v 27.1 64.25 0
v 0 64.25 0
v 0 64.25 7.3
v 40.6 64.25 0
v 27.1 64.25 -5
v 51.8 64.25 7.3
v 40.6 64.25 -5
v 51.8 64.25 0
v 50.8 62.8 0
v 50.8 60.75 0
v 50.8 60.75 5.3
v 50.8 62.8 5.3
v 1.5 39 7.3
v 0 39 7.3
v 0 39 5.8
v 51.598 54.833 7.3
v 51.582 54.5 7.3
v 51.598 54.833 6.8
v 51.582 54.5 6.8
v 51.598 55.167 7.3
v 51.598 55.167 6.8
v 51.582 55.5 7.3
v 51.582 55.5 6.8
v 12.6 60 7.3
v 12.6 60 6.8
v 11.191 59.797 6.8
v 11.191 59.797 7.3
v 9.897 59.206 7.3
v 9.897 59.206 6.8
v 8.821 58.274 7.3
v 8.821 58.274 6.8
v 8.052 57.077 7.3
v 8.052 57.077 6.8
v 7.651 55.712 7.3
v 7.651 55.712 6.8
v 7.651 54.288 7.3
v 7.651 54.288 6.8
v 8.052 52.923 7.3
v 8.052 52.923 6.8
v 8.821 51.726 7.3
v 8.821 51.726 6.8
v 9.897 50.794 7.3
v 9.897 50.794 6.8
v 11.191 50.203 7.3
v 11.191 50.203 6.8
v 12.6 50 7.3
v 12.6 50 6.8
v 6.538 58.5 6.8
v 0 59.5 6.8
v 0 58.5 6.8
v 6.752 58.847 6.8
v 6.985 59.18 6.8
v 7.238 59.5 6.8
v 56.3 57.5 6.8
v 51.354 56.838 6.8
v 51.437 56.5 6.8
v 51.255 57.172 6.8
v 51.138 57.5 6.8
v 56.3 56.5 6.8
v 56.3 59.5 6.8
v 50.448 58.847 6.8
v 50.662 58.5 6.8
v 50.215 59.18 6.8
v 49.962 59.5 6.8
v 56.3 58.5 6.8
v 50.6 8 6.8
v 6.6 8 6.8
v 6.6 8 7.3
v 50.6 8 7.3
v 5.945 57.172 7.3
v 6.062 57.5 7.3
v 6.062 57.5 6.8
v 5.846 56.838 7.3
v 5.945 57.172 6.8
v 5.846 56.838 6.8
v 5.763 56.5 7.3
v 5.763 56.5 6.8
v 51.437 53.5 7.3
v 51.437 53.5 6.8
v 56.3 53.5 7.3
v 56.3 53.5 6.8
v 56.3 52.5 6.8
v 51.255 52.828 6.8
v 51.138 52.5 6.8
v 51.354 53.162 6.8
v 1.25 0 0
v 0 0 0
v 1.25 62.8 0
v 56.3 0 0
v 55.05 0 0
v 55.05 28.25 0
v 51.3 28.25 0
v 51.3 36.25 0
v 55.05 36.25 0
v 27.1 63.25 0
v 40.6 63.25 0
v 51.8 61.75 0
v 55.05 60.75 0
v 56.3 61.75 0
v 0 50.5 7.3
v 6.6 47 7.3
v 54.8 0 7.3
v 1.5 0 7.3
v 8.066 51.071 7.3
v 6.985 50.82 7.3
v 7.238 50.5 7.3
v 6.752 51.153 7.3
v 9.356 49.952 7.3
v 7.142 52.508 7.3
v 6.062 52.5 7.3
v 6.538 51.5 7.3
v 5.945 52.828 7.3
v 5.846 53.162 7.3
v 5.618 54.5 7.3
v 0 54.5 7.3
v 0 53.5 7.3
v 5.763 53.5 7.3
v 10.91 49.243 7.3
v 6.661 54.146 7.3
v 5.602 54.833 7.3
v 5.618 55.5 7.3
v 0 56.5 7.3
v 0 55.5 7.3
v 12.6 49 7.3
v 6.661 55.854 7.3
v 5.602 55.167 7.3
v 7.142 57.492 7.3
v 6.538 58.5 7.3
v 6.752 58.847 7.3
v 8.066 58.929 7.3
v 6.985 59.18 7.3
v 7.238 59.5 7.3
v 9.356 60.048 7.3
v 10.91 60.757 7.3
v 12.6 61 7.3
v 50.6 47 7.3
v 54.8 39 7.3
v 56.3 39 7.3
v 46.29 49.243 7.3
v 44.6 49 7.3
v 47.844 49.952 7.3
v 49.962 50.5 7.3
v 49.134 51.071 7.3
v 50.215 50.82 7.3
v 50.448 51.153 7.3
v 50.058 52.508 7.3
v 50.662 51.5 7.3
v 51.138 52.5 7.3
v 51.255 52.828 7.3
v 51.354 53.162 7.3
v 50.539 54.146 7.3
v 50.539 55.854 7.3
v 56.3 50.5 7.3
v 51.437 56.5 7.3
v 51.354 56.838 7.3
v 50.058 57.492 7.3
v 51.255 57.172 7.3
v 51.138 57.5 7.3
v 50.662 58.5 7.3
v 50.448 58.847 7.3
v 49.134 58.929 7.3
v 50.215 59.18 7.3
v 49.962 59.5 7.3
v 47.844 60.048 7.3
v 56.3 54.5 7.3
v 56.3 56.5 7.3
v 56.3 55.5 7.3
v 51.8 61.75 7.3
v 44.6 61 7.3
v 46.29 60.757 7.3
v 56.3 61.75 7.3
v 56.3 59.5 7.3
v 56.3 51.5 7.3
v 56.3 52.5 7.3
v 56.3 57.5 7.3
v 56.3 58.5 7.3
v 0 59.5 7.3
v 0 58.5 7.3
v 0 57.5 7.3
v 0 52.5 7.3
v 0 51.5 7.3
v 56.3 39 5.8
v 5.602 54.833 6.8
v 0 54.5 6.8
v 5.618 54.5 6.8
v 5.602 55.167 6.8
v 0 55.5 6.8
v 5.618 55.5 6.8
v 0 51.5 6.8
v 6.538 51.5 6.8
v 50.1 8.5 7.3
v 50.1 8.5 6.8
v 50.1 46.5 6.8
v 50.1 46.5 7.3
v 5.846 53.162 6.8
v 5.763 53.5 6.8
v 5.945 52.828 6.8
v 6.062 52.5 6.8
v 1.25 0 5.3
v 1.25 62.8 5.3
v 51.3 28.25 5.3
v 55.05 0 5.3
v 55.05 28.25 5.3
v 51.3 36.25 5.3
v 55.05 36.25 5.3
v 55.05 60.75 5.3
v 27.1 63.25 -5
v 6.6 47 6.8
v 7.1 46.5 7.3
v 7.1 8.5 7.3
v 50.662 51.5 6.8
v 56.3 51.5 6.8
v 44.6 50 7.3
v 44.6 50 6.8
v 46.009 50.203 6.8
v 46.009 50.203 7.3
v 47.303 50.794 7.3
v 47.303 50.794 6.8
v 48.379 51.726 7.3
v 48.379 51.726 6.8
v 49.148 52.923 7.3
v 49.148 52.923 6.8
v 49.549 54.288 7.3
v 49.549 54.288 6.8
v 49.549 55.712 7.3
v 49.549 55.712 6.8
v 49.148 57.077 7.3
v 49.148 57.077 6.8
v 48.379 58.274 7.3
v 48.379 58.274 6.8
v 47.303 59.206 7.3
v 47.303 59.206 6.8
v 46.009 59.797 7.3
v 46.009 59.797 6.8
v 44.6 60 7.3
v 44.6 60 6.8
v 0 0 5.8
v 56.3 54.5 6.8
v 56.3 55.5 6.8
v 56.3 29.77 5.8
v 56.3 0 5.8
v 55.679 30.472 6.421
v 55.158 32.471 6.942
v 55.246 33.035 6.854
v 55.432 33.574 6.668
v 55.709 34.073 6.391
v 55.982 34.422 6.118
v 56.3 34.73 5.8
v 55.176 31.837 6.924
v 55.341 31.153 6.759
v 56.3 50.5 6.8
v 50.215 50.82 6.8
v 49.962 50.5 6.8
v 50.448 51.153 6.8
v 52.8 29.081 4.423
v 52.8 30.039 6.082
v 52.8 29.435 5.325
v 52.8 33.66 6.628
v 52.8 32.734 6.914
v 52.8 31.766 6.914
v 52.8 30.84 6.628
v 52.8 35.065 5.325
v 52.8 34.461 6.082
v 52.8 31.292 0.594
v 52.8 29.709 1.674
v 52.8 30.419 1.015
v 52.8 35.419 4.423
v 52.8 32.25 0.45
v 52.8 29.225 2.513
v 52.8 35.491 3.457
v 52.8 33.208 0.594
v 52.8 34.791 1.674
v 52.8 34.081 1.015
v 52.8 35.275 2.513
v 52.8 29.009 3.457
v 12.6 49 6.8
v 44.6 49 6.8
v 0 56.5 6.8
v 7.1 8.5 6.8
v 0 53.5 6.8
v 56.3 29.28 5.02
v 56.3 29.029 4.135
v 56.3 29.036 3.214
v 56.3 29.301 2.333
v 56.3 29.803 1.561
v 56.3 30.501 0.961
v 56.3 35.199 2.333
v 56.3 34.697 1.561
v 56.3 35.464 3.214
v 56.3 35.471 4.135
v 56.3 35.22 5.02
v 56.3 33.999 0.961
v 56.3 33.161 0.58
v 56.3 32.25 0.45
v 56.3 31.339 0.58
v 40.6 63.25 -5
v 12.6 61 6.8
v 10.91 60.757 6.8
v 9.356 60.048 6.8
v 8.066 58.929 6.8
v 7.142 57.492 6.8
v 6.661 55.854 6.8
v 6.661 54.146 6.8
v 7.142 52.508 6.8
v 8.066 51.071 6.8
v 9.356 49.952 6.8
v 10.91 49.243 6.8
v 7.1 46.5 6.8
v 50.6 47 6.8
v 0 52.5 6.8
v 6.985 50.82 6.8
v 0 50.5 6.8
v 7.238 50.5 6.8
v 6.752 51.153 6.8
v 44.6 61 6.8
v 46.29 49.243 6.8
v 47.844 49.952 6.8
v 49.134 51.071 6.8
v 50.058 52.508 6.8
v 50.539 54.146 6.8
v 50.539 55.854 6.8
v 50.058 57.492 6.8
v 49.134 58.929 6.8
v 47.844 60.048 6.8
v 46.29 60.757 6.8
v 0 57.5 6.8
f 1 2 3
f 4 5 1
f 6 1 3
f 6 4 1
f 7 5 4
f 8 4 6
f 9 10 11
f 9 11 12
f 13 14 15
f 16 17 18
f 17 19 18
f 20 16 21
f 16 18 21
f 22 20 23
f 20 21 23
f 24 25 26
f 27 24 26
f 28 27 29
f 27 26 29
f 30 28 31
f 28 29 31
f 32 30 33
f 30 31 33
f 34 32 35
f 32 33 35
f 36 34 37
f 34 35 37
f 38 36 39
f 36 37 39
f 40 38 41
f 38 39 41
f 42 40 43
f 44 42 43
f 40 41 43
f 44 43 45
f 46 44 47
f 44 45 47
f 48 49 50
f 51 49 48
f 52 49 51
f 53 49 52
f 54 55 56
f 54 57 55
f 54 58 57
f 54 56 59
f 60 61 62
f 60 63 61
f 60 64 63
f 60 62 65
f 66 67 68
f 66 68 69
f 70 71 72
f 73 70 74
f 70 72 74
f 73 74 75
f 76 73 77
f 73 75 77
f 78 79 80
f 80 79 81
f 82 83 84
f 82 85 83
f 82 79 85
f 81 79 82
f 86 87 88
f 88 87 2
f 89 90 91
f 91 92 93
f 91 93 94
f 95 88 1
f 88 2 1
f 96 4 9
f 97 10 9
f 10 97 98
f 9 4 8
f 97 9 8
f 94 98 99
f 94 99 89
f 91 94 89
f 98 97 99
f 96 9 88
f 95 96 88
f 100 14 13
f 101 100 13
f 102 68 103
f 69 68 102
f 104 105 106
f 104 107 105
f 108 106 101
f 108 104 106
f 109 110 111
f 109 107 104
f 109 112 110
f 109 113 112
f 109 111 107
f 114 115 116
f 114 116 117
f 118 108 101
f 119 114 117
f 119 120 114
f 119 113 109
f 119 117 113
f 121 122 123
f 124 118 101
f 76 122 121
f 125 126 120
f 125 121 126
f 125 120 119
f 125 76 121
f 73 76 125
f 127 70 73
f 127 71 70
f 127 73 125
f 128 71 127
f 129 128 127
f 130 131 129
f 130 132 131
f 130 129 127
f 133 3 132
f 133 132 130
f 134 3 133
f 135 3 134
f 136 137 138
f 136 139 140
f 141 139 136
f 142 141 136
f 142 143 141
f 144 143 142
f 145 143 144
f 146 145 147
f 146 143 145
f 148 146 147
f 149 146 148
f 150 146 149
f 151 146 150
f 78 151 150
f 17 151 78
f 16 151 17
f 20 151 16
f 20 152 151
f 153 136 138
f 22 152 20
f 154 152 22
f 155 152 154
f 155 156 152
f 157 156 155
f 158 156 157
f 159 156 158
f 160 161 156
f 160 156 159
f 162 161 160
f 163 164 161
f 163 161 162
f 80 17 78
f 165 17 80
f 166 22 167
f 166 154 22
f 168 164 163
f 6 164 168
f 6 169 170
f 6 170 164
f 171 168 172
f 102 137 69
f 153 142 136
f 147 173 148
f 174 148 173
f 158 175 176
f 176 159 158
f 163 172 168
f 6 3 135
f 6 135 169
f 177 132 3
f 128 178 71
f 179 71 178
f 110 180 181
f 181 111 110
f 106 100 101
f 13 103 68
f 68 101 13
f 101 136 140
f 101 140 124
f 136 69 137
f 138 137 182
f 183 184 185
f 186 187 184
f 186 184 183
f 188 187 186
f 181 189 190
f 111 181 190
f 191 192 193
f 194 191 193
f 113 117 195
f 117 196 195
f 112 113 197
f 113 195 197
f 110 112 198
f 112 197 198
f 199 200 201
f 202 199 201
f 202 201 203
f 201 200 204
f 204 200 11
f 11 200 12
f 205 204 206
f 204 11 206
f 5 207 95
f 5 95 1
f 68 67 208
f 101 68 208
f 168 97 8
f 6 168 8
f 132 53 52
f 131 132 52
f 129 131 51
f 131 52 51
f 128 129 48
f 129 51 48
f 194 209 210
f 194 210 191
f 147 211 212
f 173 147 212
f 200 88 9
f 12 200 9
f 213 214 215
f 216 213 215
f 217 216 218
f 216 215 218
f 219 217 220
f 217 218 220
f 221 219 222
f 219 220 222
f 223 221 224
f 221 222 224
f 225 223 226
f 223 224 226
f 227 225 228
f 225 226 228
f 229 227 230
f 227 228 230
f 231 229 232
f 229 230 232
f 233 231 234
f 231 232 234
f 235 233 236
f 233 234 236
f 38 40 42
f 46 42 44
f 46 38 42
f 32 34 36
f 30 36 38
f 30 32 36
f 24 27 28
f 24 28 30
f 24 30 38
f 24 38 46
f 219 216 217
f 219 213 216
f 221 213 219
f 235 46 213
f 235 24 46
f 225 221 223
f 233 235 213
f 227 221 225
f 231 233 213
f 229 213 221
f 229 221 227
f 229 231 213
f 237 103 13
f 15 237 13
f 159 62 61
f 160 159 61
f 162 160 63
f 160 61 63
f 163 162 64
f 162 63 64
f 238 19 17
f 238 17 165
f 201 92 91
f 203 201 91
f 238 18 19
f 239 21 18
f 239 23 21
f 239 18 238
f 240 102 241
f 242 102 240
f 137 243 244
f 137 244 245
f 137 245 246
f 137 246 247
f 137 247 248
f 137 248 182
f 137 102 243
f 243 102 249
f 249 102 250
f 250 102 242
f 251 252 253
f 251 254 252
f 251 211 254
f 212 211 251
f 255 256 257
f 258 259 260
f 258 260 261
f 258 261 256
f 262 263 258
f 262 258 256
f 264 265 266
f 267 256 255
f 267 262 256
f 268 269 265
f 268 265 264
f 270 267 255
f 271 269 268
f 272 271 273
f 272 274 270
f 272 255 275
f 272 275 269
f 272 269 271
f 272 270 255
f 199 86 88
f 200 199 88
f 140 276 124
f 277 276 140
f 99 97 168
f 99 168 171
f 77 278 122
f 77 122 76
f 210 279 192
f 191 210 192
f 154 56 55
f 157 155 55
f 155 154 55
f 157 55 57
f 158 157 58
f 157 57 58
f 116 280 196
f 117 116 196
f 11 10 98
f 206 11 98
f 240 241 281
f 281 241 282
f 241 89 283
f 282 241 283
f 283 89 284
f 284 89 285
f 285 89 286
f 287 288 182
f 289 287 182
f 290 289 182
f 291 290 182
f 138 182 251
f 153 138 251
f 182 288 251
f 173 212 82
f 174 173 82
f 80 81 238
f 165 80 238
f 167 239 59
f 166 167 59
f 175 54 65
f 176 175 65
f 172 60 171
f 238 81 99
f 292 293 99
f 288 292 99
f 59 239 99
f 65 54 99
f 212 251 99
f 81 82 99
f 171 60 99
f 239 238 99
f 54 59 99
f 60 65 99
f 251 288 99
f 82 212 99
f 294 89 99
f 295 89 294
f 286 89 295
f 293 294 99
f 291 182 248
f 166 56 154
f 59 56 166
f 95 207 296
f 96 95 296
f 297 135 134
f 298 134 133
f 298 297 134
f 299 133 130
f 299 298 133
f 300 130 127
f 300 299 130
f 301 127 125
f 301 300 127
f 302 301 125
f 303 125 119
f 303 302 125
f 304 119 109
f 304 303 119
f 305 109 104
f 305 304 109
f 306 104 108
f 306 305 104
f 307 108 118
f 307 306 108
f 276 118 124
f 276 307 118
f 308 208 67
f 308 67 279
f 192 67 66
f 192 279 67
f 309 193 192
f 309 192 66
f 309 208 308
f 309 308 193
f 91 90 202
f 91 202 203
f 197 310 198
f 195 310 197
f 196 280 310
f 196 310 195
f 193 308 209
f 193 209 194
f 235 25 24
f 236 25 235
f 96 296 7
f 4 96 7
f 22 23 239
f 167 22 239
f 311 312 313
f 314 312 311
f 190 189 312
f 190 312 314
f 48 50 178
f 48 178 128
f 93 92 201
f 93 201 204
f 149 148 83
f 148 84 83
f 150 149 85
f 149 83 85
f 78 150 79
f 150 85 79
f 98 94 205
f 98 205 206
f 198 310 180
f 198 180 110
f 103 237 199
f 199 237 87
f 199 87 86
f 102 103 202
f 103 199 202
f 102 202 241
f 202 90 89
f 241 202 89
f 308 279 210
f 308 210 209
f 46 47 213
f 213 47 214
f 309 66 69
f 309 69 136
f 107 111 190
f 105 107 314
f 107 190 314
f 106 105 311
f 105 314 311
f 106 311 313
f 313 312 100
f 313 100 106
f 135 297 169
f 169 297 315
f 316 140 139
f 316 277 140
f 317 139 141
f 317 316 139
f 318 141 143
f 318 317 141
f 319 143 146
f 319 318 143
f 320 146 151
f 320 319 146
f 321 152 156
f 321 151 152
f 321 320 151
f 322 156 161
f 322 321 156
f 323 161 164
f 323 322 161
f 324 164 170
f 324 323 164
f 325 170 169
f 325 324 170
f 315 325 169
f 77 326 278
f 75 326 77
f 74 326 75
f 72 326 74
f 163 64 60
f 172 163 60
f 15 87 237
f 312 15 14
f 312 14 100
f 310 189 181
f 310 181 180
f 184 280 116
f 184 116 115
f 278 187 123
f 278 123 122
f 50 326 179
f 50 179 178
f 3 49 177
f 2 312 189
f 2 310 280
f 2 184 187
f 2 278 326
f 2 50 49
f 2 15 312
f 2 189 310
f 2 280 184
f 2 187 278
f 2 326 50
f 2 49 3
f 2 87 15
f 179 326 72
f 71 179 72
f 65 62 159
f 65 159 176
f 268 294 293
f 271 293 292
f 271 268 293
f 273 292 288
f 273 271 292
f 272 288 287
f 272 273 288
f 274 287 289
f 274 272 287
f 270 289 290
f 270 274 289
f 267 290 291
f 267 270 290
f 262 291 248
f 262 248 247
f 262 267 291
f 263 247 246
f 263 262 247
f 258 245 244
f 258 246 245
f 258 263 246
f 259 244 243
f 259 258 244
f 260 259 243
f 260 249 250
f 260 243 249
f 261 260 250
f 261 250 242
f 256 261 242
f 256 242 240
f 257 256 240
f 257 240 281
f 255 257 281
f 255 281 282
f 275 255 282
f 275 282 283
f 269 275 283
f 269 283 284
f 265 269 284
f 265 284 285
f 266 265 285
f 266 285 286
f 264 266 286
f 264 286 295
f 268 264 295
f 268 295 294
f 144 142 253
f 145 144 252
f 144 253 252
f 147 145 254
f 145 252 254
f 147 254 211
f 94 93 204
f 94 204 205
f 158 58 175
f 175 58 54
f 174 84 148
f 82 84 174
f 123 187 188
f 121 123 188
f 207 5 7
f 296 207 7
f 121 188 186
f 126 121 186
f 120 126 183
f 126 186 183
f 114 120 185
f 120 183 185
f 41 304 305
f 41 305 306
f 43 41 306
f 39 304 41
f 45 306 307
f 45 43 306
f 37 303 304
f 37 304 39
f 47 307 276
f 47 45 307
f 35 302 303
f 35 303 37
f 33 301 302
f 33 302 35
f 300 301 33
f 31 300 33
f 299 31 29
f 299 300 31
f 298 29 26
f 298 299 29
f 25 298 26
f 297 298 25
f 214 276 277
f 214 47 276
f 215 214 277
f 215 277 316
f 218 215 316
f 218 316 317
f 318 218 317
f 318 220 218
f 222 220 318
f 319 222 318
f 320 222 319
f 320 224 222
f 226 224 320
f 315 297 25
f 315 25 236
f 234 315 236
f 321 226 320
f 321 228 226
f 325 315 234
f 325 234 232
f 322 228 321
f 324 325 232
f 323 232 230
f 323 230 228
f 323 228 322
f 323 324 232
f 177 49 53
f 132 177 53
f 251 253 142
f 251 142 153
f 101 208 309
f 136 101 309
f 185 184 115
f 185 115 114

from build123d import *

# Parameters (mm, degrees)
CYLINDER_R        = 3.25
CYLINDER_DEPTH    = 3.5
BOX017_W          = 43
BOX017_H          = 38
BOX017_DEPTH      = 0.5
BOX057_W          = 4
BOX057_H          = 8
BOX057_DEPTH      = 5.3
BOX001_W          = 4.5
BOX001_H          = 2.5
BOX001_DEPTH      = 5.3
BOX003_W          = 5.5
BOX003_H          = 3.5
BOX003_DEPTH      = 5.3
BOX002_W          = 53.8
BOX002_H          = 62.8
BOX002_DEPTH      = 5.3
BOX_W             = 56.3
BOX_H             = 64.25
BOX_DEPTH         = 5.3
BOX056_W          = 13.5
BOX056_H          = 1
BOX056_DEPTH      = 5
BOX041_W          = 44
BOX041_H          = 39
BOX041_DEPTH      = 0.5
BOX008_W          = 56.3
BOX008_H          = 39
BOX008_DEPTH      = 2
CHAMFER_SIZE      = 1.5
CYLINDER011_R     = 5
CYLINDER011_DEPTH = 0.5
BOX055_W          = 32
BOX055_H          = 10
BOX055_DEPTH      = 0.5
CYLINDER010_R     = 5
CYLINDER010_DEPTH = 0.5
BOX044_W          = 32
BOX044_H          = 12
BOX044_DEPTH      = 1
CYLINDER007_R     = 6
CYLINDER007_DEPTH = 1
CYLINDER006_R     = 6
CYLINDER006_DEPTH = 1
CYLINDER008_R     = 7
CYLINDER008_DEPTH = 1
BOX047_W          = 10
BOX047_H          = 1
BOX047_DEPTH      = 1
BOX049_W          = 10
BOX049_H          = 1
BOX049_DEPTH      = 1
BOX048_W          = 10
BOX048_H          = 1
BOX048_DEPTH      = 1
BOX046_W          = 10
BOX046_H          = 1
BOX046_DEPTH      = 1
BOX045_W          = 10
BOX045_H          = 1
BOX045_DEPTH      = 1
CYLINDER009_R     = 7
CYLINDER009_DEPTH = 1
BOX051_W          = 10
BOX051_H          = 1
BOX051_DEPTH      = 1
BOX054_W          = 10
BOX054_H          = 1
BOX054_DEPTH      = 1
BOX053_W          = 10
BOX053_H          = 1
BOX053_DEPTH      = 1
BOX052_W          = 10
BOX052_H          = 1
BOX052_DEPTH      = 1
BOX050_W          = 10
BOX050_H          = 1
BOX050_DEPTH      = 1
BOX010_W          = 10
BOX010_H          = 10
BOX010_DEPTH      = 10
BOX007_W          = 56.3
BOX007_H          = 25.25
BOX007_DEPTH      = 2


with BuildPart() as cylinder_magnet:
    # Cylinder → Cylinder (new body)
    with BuildSketch(Plane(origin=(52.8, 32.25, 3.7), x_dir=(0, 0, -1), z_dir=(1, 0, 0))):
        Circle(CYLINDER_R)
    extrude(amount=CYLINDER_DEPTH)


with BuildPart() as cube_game_lable_inner:
    # Box017 → Box017 (new body)
    with BuildSketch(Plane(origin=(7.1, 8.5, 6.8), x_dir=(1, 0, 0), z_dir=(0, 0, 1))):
        with Locations((21.5, 19)):
            Rectangle(BOX017_W, BOX017_H)
    extrude(amount=BOX017_DEPTH)


with BuildPart() as cube_magnet_black:
    # Box057 → Box057 (new body)
    with BuildSketch(Plane(origin=(51.3, 28.25, 0), x_dir=(1, 0, 0), z_dir=(0, 0, 1))):
        with Locations((2, 4)):
            Rectangle(BOX057_W, BOX057_H)
    extrude(amount=BOX057_DEPTH)


with BuildPart() as cube_corner_inner:
    # Box001 → Box001 (new body)
    with BuildSketch(Plane(origin=(51.8, 61.75, 0), x_dir=(1, 0, 0), z_dir=(0, 0, 1))):
        with Locations((2.25, 1.25)):
            Rectangle(BOX001_W, BOX001_H)
    extrude(amount=BOX001_DEPTH)


with BuildPart() as cube_corner_outer:
    # Box003 → Box003 (new body)
    with BuildSketch(Plane(origin=(50.8, 60.75, 0), x_dir=(1, 0, 0), z_dir=(0, 0, 1))):
        with Locations((2.75, 1.75)):
            Rectangle(BOX003_W, BOX003_H)
    extrude(amount=BOX003_DEPTH)


with BuildPart() as cube_inner_base:
    # Box002 → Box002 (new body)
    with BuildSketch(Plane(origin=(1.25, 0, 0), x_dir=(1, 0, 0), z_dir=(0, 0, 1))):
        with Locations((26.9, 31.4)):
            Rectangle(BOX002_W, BOX002_H)
    extrude(amount=BOX002_DEPTH)


with BuildPart() as cut024:
    # Box → Box (new body)
    with BuildSketch(Plane.XY):
        with Locations((28.15, 32.125)):
            Rectangle(BOX_W, BOX_H)
    extrude(amount=BOX_DEPTH)

    # Cut: cut Cube(inner_base)
    add(cube_inner_base.part, mode=Mode.SUBTRACT)

    # Fusion: union Cube(corner_outer)
    add(cube_corner_outer.part)

    # Cut024: cut Cube(corner_inner)
    add(cube_corner_inner.part, mode=Mode.SUBTRACT)


with BuildPart() as cube_sd_card_cover:
    # Box056 → Box056 (new body)
    with BuildSketch(Plane(origin=(27.1, 63.25, -5), x_dir=(1, 0, 0), z_dir=(0, 0, 1))):
        with Locations((6.75, 0.5)):
            Rectangle(BOX056_W, BOX056_H)
    extrude(amount=BOX056_DEPTH)


with BuildPart() as cube_game_lable_outer:
    # Box041 → Box041 (new body)
    with BuildSketch(Plane(origin=(6.6, 8, 6.8), x_dir=(1, 0, 0), z_dir=(0, 0, 1))):
        with Locations((22, 19.5)):
            Rectangle(BOX041_W, BOX041_H)
    extrude(amount=BOX041_DEPTH)


with BuildPart() as chamfer_body:
    # Box008 → Box008 (new body)
    with BuildSketch(Plane.XY.offset(5.3)):
        with Locations((28.15, 19.5)):
            Rectangle(BOX008_W, BOX008_H)
    extrude(amount=BOX008_DEPTH)

    # Chamfer
    chamfer_edges = [chamfer_body.edges().sort_by_distance(p)[0] for p in [
        (0, 19.5, 7.3),
        (56.3, 19.5, 7.3),
    ]]
    chamfer(chamfer_edges, length=CHAMFER_SIZE)


with BuildPart() as cylinder002_right_nintendo_inner:
    # Cylinder011 → Cylinder011 (new body)
    with BuildSketch(Plane(origin=(44.6, 55, 6.8), x_dir=(1, 0, 0), z_dir=(0, 0, 1))):
        Circle(CYLINDER011_R)
    extrude(amount=CYLINDER011_DEPTH)


with BuildPart() as cube_middle_nintendo_inner:
    # Box055 → Box055 (new body)
    with BuildSketch(Plane(origin=(12.6, 50, 6.8), x_dir=(1, 0, 0), z_dir=(0, 0, 1))):
        with Locations((16, 5)):
            Rectangle(BOX055_W, BOX055_H)
    extrude(amount=BOX055_DEPTH)


with BuildPart() as fusion033:
    # Cylinder010 → Cylinder010 (new body)
    with BuildSketch(Plane(origin=(12.6, 55, 6.8), x_dir=(1, 0, 0), z_dir=(0, 0, 1))):
        Circle(CYLINDER010_R)
    extrude(amount=CYLINDER010_DEPTH)

    # Fusion033: union Cylinder002(right_nintendo_inner), Cube(middle_nintendo_inner)
    add(cylinder002_right_nintendo_inner.part)
    add(cube_middle_nintendo_inner.part)


with BuildPart() as cube_middle_nintendo_outer:
    # Box044 → Box044 (new body)
    with BuildSketch(Plane(origin=(12.6, 49, 6.8), x_dir=(1, 0, 0), z_dir=(0, 0, 1))):
        with Locations((16, 6)):
            Rectangle(BOX044_W, BOX044_H)
    extrude(amount=BOX044_DEPTH)


with BuildPart() as cylinder002_right_nintendo_outer:
    # Cylinder007 → Cylinder007 (new body)
    with BuildSketch(Plane(origin=(44.6, 55, 6.8), x_dir=(1, 0, 0), z_dir=(0, 0, 1))):
        Circle(CYLINDER007_R)
    extrude(amount=CYLINDER007_DEPTH)


with BuildPart() as cylinder001_left_nintendo_outer:
    # Cylinder006 → Cylinder006 (new body)
    with BuildSketch(Plane(origin=(12.6, 55, 6.8), x_dir=(1, 0, 0), z_dir=(0, 0, 1))):
        Circle(CYLINDER006_R)
    extrude(amount=CYLINDER006_DEPTH)


with BuildPart() as cylinder001_left_nintendo_fin_cut:
    # Cylinder008 → Cylinder008 (new body)
    with BuildSketch(Plane(origin=(12.6, 55, 6.8), x_dir=(1, 0, 0), z_dir=(0, 0, 1))):
        Circle(CYLINDER008_R)
    extrude(amount=CYLINDER008_DEPTH)


with BuildPart() as box047:
    # Box047 → Box047 (new body)
    with BuildSketch(Plane(origin=(0, 54.5, 6.8), x_dir=(1, 0, 0), z_dir=(0, 0, 1))):
        with Locations((5, 0.5)):
            Rectangle(BOX047_W, BOX047_H)
    extrude(amount=BOX047_DEPTH)


with BuildPart() as box049:
    # Box049 → Box049 (new body)
    with BuildSketch(Plane(origin=(0, 58.5, 6.8), x_dir=(1, 0, 0), z_dir=(0, 0, 1))):
        with Locations((5, 0.5)):
            Rectangle(BOX049_W, BOX049_H)
    extrude(amount=BOX049_DEPTH)


with BuildPart() as box048:
    # Box048 → Box048 (new body)
    with BuildSketch(Plane(origin=(0, 56.5, 6.8), x_dir=(1, 0, 0), z_dir=(0, 0, 1))):
        with Locations((5, 0.5)):
            Rectangle(BOX048_W, BOX048_H)
    extrude(amount=BOX048_DEPTH)


with BuildPart() as box046:
    # Box046 → Box046 (new body)
    with BuildSketch(Plane(origin=(0, 52.5, 6.8), x_dir=(1, 0, 0), z_dir=(0, 0, 1))):
        with Locations((5, 0.5)):
            Rectangle(BOX046_W, BOX046_H)
    extrude(amount=BOX046_DEPTH)


with BuildPart() as cut009:
    # Box045 → Box045 (new body)
    with BuildSketch(Plane(origin=(0, 50.5, 6.8), x_dir=(1, 0, 0), z_dir=(0, 0, 1))):
        with Locations((5, 0.5)):
            Rectangle(BOX045_W, BOX045_H)
    extrude(amount=BOX045_DEPTH)

    # Fusion004: union Box047, Box049, Box048, Box046
    add(box047.part)
    add(box049.part)
    add(box048.part)
    add(box046.part)

    # Cut009: cut Cylinder001(left_nintendo_fin_cut)
    add(cylinder001_left_nintendo_fin_cut.part, mode=Mode.SUBTRACT)


with BuildPart() as cylinder002_right_nintendo_fin_cut:
    # Cylinder009 → Cylinder009 (new body)
    with BuildSketch(Plane(origin=(44.6, 55, 6.8), x_dir=(1, 0, 0), z_dir=(0, 0, 1))):
        Circle(CYLINDER009_R)
    extrude(amount=CYLINDER009_DEPTH)


with BuildPart() as box051:
    # Box051 → Box051 (new body)
    with BuildSketch(Plane(origin=(46.3, 54.5, 6.8), x_dir=(1, 0, 0), z_dir=(0, 0, 1))):
        with Locations((5, 0.5)):
            Rectangle(BOX051_W, BOX051_H)
    extrude(amount=BOX051_DEPTH)


with BuildPart() as box054:
    # Box054 → Box054 (new body)
    with BuildSketch(Plane(origin=(46.3, 52.5, 6.8), x_dir=(1, 0, 0), z_dir=(0, 0, 1))):
        with Locations((5, 0.5)):
            Rectangle(BOX054_W, BOX054_H)
    extrude(amount=BOX054_DEPTH)


with BuildPart() as box053:
    # Box053 → Box053 (new body)
    with BuildSketch(Plane(origin=(46.3, 56.5, 6.8), x_dir=(1, 0, 0), z_dir=(0, 0, 1))):
        with Locations((5, 0.5)):
            Rectangle(BOX053_W, BOX053_H)
    extrude(amount=BOX053_DEPTH)


with BuildPart() as box052:
    # Box052 → Box052 (new body)
    with BuildSketch(Plane(origin=(46.3, 58.5, 6.8), x_dir=(1, 0, 0), z_dir=(0, 0, 1))):
        with Locations((5, 0.5)):
            Rectangle(BOX052_W, BOX052_H)
    extrude(amount=BOX052_DEPTH)


with BuildPart() as cut008:
    # Box050 → Box050 (new body)
    with BuildSketch(Plane(origin=(46.3, 50.5, 6.8), x_dir=(1, 0, 0), z_dir=(0, 0, 1))):
        with Locations((5, 0.5)):
            Rectangle(BOX050_W, BOX050_H)
    extrude(amount=BOX050_DEPTH)

    # Fusion003: union Box051, Box054, Box053, Box052
    add(box051.part)
    add(box054.part)
    add(box053.part)
    add(box052.part)

    # Cut008: cut Cylinder002(right_nintendo_fin_cut)
    add(cylinder002_right_nintendo_fin_cut.part, mode=Mode.SUBTRACT)


with BuildPart() as cube_top_corner_cut:
    # Box010 → Box010 (new body)
    with BuildSketch(Plane(origin=(51.8, 61.75, 0), x_dir=(1, 0, 0), z_dir=(0, 0, 1))):
        with Locations((5, 5)):
            Rectangle(BOX010_W, BOX010_H)
    extrude(amount=BOX010_DEPTH)


with BuildPart() as cut026:
    # Box007 → Box007 (new body)
    with BuildSketch(Plane(origin=(0, 39, 5.3), x_dir=(1, 0, 0), z_dir=(0, 0, 1))):
        with Locations((28.15, 12.625)):
            Rectangle(BOX007_W, BOX007_H)
    extrude(amount=BOX007_DEPTH)

    # Cut006: cut Cube(top_corner_cut)
    add(cube_top_corner_cut.part, mode=Mode.SUBTRACT)

    # Cut010: cut Cut008
    add(cut008.part, mode=Mode.SUBTRACT)

    # Cut011: cut Cut009
    add(cut009.part, mode=Mode.SUBTRACT)

    # Cut012: cut Cylinder001(left_nintendo_outer)
    add(cylinder001_left_nintendo_outer.part, mode=Mode.SUBTRACT)

    # Cut013: cut Cylinder002(right_nintendo_outer)
    add(cylinder002_right_nintendo_outer.part, mode=Mode.SUBTRACT)

    # Cut014: cut Cube(middle_nintendo_outer)
    add(cube_middle_nintendo_outer.part, mode=Mode.SUBTRACT)

    # Fusion034: union Chamfer body, Fusion033
    add(chamfer_body.part)
    add(fusion033.part)

    # Cut025: cut Cube(game_lable_outer)
    add(cube_game_lable_outer.part, mode=Mode.SUBTRACT)

    # Fusion035: union Cube(game_lable_inner), Cube(magnet_black), Cut024, Cube(sd_card_cover)
    add(cube_game_lable_inner.part)
    add(cube_magnet_black.part)
    add(cut024.part)
    add(cube_sd_card_cover.part)

    # Cut026: cut Cylinder(magnet)
    add(cylinder_magnet.part, mode=Mode.SUBTRACT)


solid = cut026.part
